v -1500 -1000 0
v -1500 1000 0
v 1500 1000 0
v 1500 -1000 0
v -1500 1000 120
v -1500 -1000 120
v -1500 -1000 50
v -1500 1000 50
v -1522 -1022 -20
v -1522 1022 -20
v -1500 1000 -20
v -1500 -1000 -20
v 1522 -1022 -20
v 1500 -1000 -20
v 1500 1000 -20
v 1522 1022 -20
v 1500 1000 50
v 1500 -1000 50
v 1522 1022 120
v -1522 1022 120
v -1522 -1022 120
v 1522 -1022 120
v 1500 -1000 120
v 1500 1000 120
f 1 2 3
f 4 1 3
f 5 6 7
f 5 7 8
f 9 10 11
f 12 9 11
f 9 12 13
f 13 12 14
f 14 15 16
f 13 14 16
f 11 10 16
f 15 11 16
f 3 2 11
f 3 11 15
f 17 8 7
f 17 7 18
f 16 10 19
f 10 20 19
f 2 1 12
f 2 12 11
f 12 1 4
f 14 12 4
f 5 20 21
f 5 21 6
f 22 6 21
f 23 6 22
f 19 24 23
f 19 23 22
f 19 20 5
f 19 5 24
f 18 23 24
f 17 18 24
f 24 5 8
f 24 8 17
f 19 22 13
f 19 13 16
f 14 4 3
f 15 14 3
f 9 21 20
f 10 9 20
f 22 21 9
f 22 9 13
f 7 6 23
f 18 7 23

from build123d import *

# Parameters (mm, degrees)
SKETCH_W      = 3000
SKETCH_H      = 2000
PAD_DEPTH     = 50
SKETCH001_W   = 3044
SKETCH001_H   = 2044
SKETCH001_W_2 = 3000
SKETCH001_H_2 = 2000
PAD001_DEPTH  = 70


with BuildPart() as part:
    # Sketch → Pad (new body)
    with BuildSketch(Plane.XY):
        Rectangle(SKETCH_W, SKETCH_H)
    extrude(amount=PAD_DEPTH)

    # Sketch001 → Pad001 (new body, symmetric)
    with BuildSketch(Plane.XY.offset(50)):
        Rectangle(SKETCH001_W, SKETCH001_H)
        Rectangle(SKETCH001_W_2, SKETCH001_H_2, mode=Mode.SUBTRACT)
    extrude(amount=PAD001_DEPTH, both=True)


solid = part.part
